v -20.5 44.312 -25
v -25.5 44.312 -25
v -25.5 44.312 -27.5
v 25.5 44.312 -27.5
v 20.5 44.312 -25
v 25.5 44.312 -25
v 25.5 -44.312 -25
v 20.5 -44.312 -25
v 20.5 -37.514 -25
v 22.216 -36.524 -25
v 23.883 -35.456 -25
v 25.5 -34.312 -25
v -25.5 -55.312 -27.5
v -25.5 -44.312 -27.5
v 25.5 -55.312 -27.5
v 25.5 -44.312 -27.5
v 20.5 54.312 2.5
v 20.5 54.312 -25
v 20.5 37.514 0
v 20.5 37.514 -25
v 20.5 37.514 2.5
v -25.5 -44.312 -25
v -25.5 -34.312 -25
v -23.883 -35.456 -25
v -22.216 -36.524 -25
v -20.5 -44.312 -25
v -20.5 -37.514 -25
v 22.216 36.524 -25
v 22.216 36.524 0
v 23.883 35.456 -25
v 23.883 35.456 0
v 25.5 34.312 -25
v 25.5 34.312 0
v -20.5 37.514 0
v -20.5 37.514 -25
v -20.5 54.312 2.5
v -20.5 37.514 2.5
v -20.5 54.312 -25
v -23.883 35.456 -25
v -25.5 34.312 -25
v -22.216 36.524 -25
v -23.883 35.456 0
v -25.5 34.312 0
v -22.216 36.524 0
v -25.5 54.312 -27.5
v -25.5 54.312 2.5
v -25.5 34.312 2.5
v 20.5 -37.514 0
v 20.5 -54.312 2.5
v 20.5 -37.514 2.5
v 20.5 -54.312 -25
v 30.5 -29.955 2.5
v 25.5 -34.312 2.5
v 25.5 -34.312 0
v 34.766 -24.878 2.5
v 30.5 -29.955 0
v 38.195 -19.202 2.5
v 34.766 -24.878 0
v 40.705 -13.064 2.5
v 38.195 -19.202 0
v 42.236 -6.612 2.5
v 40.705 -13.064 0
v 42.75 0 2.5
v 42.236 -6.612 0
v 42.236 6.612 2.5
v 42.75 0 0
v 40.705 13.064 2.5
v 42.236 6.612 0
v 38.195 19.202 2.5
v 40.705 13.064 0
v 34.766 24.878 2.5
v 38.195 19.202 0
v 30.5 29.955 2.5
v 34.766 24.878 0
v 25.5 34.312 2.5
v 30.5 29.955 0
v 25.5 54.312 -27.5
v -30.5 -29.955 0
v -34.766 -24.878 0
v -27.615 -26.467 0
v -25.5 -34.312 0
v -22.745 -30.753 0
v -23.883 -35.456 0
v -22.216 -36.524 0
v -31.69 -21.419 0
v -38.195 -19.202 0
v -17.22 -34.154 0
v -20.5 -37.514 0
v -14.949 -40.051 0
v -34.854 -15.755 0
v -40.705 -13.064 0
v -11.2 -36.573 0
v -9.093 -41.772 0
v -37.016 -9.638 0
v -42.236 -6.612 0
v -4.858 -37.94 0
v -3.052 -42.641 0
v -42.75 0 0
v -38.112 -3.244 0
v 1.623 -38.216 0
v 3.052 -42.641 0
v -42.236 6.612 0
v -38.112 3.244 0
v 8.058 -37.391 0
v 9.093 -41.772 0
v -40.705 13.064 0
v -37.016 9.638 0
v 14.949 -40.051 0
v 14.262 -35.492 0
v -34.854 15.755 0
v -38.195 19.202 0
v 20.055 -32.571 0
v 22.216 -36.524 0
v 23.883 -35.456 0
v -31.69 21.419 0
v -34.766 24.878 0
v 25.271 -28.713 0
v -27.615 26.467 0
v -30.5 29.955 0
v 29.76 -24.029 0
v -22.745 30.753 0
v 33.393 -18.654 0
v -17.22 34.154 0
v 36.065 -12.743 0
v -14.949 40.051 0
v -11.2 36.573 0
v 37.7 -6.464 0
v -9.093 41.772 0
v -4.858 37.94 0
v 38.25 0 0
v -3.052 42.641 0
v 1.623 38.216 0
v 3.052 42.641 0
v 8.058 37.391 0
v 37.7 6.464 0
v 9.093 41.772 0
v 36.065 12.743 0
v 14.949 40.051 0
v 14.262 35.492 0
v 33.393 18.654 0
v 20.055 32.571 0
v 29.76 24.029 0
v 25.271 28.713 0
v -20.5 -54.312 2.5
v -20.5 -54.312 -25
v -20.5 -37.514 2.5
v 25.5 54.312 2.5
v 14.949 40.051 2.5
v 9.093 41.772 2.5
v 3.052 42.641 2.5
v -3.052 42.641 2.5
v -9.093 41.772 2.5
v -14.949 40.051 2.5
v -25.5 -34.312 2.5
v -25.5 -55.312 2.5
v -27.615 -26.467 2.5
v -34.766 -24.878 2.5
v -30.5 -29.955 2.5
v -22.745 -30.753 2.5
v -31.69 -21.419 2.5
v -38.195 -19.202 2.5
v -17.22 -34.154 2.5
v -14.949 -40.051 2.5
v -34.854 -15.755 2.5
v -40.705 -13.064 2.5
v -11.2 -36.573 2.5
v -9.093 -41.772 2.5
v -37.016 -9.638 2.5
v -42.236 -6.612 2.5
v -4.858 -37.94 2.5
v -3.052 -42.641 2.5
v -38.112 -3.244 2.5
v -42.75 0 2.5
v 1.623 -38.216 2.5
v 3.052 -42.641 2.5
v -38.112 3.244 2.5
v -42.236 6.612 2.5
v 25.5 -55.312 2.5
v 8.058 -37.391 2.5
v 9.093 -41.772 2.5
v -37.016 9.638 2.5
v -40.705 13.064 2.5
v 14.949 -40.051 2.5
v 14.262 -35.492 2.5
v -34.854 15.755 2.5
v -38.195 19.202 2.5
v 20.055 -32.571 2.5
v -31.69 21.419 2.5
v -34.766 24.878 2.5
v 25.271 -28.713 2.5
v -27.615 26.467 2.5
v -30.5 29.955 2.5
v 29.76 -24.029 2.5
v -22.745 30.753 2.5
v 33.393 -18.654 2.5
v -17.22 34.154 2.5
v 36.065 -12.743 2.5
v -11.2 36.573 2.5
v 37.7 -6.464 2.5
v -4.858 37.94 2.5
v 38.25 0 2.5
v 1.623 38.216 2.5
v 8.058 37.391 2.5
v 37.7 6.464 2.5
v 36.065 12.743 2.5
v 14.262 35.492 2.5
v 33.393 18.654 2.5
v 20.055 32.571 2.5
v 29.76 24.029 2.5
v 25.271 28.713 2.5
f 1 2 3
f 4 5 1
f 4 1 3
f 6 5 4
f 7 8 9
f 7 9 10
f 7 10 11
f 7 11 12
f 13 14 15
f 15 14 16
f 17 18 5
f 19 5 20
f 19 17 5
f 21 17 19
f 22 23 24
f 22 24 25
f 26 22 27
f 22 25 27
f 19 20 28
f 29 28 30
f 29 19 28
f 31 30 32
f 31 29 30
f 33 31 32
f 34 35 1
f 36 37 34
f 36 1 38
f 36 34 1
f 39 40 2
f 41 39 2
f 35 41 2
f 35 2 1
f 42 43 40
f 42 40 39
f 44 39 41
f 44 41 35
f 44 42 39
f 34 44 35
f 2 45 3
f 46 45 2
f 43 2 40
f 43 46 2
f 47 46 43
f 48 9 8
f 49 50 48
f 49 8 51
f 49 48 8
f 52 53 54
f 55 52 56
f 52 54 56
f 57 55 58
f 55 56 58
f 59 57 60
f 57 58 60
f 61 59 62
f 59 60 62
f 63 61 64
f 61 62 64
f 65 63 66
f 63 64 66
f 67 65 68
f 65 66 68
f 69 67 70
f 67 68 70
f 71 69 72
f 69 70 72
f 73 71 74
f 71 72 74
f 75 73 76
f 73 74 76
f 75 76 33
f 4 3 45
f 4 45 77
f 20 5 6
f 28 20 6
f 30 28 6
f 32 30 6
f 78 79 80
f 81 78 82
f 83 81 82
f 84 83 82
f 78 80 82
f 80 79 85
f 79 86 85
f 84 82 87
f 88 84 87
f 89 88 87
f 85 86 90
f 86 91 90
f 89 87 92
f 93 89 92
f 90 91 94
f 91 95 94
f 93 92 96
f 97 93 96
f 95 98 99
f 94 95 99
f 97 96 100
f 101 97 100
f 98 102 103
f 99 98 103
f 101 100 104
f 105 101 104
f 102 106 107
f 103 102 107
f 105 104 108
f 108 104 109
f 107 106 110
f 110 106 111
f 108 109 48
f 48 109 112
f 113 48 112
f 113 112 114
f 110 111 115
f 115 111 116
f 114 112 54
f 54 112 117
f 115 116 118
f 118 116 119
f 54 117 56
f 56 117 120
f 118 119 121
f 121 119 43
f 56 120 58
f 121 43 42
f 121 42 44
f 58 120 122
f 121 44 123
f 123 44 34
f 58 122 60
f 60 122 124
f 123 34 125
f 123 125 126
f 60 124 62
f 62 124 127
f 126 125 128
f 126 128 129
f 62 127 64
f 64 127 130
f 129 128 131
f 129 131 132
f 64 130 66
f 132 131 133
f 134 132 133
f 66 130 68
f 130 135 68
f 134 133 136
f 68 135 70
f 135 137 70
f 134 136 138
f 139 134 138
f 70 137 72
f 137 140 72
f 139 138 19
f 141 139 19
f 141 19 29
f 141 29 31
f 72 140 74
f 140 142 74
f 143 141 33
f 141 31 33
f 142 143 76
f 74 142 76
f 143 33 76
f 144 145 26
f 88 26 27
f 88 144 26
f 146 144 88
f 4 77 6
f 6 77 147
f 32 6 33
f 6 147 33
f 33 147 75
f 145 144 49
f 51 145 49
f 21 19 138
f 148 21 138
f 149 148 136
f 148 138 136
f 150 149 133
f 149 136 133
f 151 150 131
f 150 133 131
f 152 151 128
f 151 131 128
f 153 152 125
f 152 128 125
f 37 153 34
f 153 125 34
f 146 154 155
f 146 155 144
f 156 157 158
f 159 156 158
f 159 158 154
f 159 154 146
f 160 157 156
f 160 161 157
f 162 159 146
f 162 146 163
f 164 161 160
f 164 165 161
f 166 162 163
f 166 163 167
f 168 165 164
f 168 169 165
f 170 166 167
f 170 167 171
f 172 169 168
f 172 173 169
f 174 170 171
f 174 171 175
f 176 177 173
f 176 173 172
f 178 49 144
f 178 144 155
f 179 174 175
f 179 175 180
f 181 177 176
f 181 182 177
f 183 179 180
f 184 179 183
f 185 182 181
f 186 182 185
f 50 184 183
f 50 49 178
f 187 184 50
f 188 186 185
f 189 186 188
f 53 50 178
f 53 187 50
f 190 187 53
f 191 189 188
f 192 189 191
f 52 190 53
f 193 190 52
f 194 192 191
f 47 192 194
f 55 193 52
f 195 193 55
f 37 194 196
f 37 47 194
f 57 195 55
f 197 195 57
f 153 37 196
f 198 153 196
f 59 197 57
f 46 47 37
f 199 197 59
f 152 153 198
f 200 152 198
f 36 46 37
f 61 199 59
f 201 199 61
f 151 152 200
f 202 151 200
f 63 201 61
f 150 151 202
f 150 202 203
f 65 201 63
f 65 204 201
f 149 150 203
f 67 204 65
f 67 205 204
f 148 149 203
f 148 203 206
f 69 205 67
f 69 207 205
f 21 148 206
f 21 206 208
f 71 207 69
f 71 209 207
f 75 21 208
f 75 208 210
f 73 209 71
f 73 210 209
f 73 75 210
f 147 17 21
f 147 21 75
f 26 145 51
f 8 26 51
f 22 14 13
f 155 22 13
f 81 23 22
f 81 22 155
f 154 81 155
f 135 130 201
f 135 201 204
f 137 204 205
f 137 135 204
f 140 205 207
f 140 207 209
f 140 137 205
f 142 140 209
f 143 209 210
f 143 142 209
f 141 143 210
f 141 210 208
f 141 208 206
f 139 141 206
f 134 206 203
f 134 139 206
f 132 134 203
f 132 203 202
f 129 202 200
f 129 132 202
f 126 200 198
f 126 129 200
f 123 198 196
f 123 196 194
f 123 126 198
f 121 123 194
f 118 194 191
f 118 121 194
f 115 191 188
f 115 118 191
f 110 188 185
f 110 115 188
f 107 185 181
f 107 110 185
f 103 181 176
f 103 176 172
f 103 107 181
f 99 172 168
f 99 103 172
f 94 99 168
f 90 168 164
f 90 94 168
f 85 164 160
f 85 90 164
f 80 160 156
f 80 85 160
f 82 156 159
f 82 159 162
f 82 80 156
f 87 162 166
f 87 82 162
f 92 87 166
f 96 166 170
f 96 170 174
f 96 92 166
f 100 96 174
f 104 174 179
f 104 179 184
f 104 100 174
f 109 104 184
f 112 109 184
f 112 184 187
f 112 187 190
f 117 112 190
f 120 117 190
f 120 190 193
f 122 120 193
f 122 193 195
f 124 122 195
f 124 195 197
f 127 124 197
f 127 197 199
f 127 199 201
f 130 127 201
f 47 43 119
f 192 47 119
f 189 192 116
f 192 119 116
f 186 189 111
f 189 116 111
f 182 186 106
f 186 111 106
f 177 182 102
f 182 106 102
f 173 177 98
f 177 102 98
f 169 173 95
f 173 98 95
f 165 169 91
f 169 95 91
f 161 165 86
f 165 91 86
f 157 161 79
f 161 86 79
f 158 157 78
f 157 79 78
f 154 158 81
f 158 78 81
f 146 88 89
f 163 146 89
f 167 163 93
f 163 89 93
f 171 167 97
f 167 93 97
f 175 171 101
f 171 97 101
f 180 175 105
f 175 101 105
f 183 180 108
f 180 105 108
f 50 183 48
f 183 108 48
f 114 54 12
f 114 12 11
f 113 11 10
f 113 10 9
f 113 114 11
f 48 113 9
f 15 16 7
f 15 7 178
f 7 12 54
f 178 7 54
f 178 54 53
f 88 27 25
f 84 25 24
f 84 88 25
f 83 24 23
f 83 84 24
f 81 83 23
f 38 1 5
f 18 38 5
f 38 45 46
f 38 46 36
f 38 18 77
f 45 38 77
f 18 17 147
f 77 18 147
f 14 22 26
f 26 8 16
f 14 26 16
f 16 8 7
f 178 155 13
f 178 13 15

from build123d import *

# Parameters (mm, degrees)
F0_R     = 42.75
F0_R_2   = 38.25
F1_DEPTH = 2.5
F3_DEPTH = 27.5
F4_W     = 51
F4_H     = 10
F5_DEPTH = 2.5
F6_W     = 51
F6_H     = 30
F7_DEPTH = 1


with BuildPart() as f1:
    # F0 (on Top) → F1 (new body)
    with BuildSketch(Plane.XY):
        Circle(F0_R)
        Circle(F0_R_2, mode=Mode.SUBTRACT)
    extrude(amount=F1_DEPTH)

    # F2 (on face) → F3 (join)
    with BuildSketch(Plane.XY.offset(2.5)):
        with BuildLine():
            Line((25.5, -54.311988), (25.5, -34.311988))
            ThreePointArc((25.5, -34.311988), (23.055661, -35.999986), (20.5, -37.514164))
            Line((20.5, -37.514164), (20.5, -54.311988))
            Line((20.5, -54.311988), (25.5, -54.311988))
        make_face()
        with BuildLine():
            ThreePointArc((-20.5, -37.514164), (-23.055661, -35.999986), (-25.5, -34.311988))
            Line((-25.5, -34.311988), (-25.5, -54.311988))
            Line((-25.5, -54.311988), (-20.5, -54.311988))
            Line((-20.5, -54.311988), (-20.5, -37.514164))
        make_face()
        with BuildLine():
            ThreePointArc((20.5, 37.514164), (23.055661, 35.999986), (25.5, 34.311988))
            Line((25.5, 34.311988), (25.5, 54.311988))
            Line((25.5, 54.311988), (20.5, 54.311988))
            Line((20.5, 54.311988), (20.5, 37.514164))
        make_face()
        with BuildLine():
            Line((-20.5, 54.311988), (-25.5, 54.311988))
            Line((-25.5, 54.311988), (-25.5, 34.311988))
            ThreePointArc((-25.5, 34.311988), (-23.055661, 35.999986), (-20.5, 37.514164))
            Line((-20.5, 37.514164), (-20.5, 54.311988))
        make_face()
    extrude(amount=-F3_DEPTH)

    # F4 (on face) → F5 (join)
    with BuildSketch(Plane(origin=(0, 0, -25), x_dir=(1, 0, 0), z_dir=(0, 0, -1))):
        with Locations((0, -49.311988)):
            Rectangle(F4_W, F4_H)
        with Locations((0, 49.311988)):
            Rectangle(F4_W, F4_H)
    extrude(amount=F5_DEPTH)

    # F6 (on face) → F7 (join)
    with BuildSketch(Plane.XZ.offset(54.311988)):
        with Locations((0, -12.5)):
            Rectangle(F6_W, F6_H)
    extrude(amount=F7_DEPTH)


solid = f1.part
